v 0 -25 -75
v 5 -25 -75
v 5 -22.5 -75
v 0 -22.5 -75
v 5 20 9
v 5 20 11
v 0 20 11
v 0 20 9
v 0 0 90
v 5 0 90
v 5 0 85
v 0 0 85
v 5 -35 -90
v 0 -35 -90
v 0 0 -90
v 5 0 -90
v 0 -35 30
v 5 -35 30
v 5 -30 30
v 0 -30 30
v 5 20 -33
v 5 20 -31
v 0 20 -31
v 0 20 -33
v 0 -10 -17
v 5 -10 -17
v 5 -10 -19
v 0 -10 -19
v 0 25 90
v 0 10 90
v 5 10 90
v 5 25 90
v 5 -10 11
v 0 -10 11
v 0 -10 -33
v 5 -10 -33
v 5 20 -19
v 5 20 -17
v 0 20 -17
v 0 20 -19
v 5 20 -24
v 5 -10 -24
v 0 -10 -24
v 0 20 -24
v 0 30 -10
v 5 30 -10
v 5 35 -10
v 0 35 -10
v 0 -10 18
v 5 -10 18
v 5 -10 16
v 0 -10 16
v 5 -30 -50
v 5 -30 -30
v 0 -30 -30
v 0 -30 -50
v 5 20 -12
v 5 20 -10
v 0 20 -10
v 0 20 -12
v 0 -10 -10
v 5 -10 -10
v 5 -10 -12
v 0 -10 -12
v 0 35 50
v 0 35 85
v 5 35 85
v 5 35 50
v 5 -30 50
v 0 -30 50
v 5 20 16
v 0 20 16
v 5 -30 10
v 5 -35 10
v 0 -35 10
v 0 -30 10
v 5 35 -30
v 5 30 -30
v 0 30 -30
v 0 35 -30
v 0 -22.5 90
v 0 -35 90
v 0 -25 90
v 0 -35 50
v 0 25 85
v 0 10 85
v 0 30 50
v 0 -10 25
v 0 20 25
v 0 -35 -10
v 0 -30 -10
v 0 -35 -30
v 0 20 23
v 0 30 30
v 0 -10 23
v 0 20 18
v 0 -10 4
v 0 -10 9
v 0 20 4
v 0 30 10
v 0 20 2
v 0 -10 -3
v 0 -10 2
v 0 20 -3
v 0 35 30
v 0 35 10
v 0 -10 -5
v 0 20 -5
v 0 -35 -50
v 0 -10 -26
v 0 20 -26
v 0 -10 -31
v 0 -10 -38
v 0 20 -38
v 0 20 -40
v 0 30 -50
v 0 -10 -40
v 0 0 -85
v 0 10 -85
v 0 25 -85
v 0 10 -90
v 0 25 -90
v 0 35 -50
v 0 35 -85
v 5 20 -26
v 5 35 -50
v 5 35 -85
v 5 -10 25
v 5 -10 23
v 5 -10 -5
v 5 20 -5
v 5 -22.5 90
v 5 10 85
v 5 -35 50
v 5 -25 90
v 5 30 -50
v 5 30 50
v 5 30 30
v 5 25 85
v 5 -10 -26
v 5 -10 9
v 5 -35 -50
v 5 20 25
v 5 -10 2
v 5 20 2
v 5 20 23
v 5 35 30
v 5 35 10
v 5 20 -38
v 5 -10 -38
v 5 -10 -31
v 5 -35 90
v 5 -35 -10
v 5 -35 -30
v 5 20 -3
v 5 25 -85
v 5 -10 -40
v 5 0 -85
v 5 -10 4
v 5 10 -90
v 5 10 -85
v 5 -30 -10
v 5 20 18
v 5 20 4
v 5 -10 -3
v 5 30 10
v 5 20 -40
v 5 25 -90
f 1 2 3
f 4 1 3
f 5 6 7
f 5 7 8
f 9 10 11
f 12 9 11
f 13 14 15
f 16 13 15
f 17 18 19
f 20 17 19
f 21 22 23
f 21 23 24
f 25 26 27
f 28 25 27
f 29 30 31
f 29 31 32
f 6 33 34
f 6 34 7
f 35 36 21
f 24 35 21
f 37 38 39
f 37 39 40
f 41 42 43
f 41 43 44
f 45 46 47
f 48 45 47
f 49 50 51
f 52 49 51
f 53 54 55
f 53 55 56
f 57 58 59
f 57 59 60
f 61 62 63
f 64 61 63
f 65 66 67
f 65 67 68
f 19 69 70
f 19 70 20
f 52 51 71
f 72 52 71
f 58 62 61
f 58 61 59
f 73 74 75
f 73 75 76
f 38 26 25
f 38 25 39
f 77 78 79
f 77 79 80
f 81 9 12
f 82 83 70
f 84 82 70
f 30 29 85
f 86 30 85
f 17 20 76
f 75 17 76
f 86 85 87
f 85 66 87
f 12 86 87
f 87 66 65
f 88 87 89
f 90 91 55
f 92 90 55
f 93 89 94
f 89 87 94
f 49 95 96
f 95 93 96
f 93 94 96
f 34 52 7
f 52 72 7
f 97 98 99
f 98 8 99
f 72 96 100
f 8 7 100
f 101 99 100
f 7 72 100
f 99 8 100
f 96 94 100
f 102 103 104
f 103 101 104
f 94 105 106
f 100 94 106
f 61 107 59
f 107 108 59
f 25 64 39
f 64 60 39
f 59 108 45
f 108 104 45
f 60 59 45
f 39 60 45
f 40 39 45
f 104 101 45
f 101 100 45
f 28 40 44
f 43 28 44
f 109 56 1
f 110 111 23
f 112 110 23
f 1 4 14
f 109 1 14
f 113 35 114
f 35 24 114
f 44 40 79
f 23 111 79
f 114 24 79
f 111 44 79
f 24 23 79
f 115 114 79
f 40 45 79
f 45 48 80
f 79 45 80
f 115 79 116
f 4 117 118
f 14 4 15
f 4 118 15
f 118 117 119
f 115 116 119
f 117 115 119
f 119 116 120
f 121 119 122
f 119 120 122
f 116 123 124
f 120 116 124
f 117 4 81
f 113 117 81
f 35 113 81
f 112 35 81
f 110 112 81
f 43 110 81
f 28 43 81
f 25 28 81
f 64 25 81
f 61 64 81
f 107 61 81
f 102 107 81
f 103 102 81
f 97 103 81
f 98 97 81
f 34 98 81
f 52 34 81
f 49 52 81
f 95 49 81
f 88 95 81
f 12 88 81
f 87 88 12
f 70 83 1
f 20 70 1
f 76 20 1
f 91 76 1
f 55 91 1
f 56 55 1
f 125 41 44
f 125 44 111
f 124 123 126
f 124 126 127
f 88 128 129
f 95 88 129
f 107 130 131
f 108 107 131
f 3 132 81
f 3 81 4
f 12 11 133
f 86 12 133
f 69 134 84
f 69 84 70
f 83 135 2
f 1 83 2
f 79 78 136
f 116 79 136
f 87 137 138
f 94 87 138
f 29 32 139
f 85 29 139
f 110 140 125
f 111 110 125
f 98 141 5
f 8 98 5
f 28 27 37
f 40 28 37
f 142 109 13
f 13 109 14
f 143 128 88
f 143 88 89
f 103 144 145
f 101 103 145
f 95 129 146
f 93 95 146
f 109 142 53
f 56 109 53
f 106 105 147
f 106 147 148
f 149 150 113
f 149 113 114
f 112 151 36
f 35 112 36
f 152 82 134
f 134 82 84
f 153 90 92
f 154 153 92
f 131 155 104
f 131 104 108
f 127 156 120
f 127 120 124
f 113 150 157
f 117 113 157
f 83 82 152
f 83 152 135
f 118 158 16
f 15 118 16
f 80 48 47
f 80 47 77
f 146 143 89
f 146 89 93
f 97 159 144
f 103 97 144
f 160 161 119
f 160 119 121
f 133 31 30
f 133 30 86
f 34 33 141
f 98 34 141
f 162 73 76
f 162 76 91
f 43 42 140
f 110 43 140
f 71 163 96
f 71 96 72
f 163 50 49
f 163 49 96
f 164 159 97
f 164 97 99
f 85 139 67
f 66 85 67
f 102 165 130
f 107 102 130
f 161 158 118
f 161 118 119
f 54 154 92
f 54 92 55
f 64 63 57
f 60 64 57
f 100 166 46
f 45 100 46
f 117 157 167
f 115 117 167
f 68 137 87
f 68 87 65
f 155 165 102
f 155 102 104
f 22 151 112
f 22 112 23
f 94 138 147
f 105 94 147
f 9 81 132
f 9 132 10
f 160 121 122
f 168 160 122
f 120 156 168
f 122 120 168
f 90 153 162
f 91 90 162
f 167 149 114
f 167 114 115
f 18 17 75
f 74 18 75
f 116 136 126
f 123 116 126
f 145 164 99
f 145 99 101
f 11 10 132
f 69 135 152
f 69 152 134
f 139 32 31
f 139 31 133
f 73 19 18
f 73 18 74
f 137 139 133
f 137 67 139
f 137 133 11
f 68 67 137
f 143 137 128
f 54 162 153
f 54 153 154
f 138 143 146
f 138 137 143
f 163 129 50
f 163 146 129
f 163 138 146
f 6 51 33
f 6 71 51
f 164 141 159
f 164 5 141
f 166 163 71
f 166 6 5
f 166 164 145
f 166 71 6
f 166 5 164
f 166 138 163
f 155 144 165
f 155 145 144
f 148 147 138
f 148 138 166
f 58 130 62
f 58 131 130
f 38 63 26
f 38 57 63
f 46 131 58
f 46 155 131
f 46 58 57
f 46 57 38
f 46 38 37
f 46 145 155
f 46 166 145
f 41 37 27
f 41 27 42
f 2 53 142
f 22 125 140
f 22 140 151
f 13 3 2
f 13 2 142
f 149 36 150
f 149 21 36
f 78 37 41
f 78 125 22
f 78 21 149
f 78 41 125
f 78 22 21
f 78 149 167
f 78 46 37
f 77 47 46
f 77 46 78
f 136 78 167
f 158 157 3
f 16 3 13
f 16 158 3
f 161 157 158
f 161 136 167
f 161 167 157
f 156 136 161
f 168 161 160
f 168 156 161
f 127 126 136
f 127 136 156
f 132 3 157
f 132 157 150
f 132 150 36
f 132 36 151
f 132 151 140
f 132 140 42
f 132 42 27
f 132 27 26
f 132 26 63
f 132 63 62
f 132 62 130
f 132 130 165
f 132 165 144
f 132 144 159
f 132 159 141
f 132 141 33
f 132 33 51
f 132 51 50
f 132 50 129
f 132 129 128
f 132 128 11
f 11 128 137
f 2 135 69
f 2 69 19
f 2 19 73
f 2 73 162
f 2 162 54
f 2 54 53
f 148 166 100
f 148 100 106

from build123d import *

# Parameters (mm, degrees)
ESQUISSE1_W             = 180
ESQUISSE1_H             = 70
BOSS_EXTRU_1_DEPTH      = 5
ESQUISSE2_W             = 165
ESQUISSE2_H             = 2.5
ENL_V_MAT_EXTRU_1_DEPTH = 5
ESQUISSE3_W             = 5
ESQUISSE3_H             = 10
ESQUISSE3_W_2           = 20
ESQUISSE3_H_2           = 5
ENL_V_MAT_EXTRU_2_DEPTH = 5
ESQUISSE4_W             = 2
ESQUISSE4_H             = 30
ENL_V_MAT_EXTRU_3_DEPTH = 5


with BuildPart() as part:
    # Esquisse1 → Boss.-Extru.1 (new body)
    with BuildSketch(Plane(origin=(0, 0, 0), x_dir=(0, 0, -1), z_dir=(1, 0, 0))):
        Rectangle(ESQUISSE1_W, ESQUISSE1_H)
    extrude(amount=BOSS_EXTRU_1_DEPTH)

    # Esquisse2 → Enlèv. mat.-Extru.1 (cut)
    with BuildSketch(Plane(origin=(5, 0, 0), x_dir=(0, 0, -1), z_dir=(1, 0, 0))):
        with Locations((-7.5, -23.75)):
            Rectangle(ESQUISSE2_W, ESQUISSE2_H)
    extrude(amount=-ENL_V_MAT_EXTRU_1_DEPTH, mode=Mode.SUBTRACT)

    # Esquisse3 → Enlèv. mat.-Extru.2 (cut)
    with BuildSketch(Plane(origin=(5, 0, 0), x_dir=(0, 0, -1), z_dir=(1, 0, 0))):
        with Locations((-87.5, 30)):
            Rectangle(ESQUISSE3_W, ESQUISSE3_H)
        with Locations((-87.5, 5)):
            Rectangle(ESQUISSE3_W, ESQUISSE3_H)
        with Locations((87.5, 30)):
            Rectangle(ESQUISSE3_W, ESQUISSE3_H)
        with Locations((87.5, 5)):
            Rectangle(ESQUISSE3_W, ESQUISSE3_H)
        with Locations((-40, 32.5)):
            Rectangle(ESQUISSE3_W_2, ESQUISSE3_H_2)
        with Locations((40, 32.5)):
            Rectangle(ESQUISSE3_W_2, ESQUISSE3_H_2)
        with Locations((0, 32.5)):
            Rectangle(ESQUISSE3_W_2, ESQUISSE3_H_2)
        with Locations((-40, -32.5)):
            Rectangle(ESQUISSE3_W_2, ESQUISSE3_H_2)
        with Locations((0, -32.5)):
            Rectangle(ESQUISSE3_W_2, ESQUISSE3_H_2)
        with Locations((40, -32.5)):
            Rectangle(ESQUISSE3_W_2, ESQUISSE3_H_2)
    extrude(amount=-ENL_V_MAT_EXTRU_2_DEPTH, mode=Mode.SUBTRACT)

    # Esquisse4 → Enlèv. mat.-Extru.3 (cut)
    with BuildSketch(Plane(origin=(5, 0, 0), x_dir=(0, 0, -1), z_dir=(1, 0, 0))):
        with Locations((32, 5)):
            Rectangle(ESQUISSE4_W, ESQUISSE4_H)
        with Locations((39, 5)):
            Rectangle(ESQUISSE4_W, ESQUISSE4_H)
        with Locations((25, 5)):
            Rectangle(ESQUISSE4_W, ESQUISSE4_H)
        with Locations((18, 5)):
            Rectangle(ESQUISSE4_W, ESQUISSE4_H)
        with Locations((11, 5)):
            Rectangle(ESQUISSE4_W, ESQUISSE4_H)
        with Locations((4, 5)):
            Rectangle(ESQUISSE4_W, ESQUISSE4_H)
        with Locations((-3, 5)):
            Rectangle(ESQUISSE4_W, ESQUISSE4_H)
        with Locations((-10, 5)):
            Rectangle(ESQUISSE4_W, ESQUISSE4_H)
        with Locations((-17, 5)):
            Rectangle(ESQUISSE4_W, ESQUISSE4_H)
        with Locations((-24, 5)):
            Rectangle(ESQUISSE4_W, ESQUISSE4_H)
    extrude(amount=-ENL_V_MAT_EXTRU_3_DEPTH, mode=Mode.SUBTRACT)


solid = part.part
